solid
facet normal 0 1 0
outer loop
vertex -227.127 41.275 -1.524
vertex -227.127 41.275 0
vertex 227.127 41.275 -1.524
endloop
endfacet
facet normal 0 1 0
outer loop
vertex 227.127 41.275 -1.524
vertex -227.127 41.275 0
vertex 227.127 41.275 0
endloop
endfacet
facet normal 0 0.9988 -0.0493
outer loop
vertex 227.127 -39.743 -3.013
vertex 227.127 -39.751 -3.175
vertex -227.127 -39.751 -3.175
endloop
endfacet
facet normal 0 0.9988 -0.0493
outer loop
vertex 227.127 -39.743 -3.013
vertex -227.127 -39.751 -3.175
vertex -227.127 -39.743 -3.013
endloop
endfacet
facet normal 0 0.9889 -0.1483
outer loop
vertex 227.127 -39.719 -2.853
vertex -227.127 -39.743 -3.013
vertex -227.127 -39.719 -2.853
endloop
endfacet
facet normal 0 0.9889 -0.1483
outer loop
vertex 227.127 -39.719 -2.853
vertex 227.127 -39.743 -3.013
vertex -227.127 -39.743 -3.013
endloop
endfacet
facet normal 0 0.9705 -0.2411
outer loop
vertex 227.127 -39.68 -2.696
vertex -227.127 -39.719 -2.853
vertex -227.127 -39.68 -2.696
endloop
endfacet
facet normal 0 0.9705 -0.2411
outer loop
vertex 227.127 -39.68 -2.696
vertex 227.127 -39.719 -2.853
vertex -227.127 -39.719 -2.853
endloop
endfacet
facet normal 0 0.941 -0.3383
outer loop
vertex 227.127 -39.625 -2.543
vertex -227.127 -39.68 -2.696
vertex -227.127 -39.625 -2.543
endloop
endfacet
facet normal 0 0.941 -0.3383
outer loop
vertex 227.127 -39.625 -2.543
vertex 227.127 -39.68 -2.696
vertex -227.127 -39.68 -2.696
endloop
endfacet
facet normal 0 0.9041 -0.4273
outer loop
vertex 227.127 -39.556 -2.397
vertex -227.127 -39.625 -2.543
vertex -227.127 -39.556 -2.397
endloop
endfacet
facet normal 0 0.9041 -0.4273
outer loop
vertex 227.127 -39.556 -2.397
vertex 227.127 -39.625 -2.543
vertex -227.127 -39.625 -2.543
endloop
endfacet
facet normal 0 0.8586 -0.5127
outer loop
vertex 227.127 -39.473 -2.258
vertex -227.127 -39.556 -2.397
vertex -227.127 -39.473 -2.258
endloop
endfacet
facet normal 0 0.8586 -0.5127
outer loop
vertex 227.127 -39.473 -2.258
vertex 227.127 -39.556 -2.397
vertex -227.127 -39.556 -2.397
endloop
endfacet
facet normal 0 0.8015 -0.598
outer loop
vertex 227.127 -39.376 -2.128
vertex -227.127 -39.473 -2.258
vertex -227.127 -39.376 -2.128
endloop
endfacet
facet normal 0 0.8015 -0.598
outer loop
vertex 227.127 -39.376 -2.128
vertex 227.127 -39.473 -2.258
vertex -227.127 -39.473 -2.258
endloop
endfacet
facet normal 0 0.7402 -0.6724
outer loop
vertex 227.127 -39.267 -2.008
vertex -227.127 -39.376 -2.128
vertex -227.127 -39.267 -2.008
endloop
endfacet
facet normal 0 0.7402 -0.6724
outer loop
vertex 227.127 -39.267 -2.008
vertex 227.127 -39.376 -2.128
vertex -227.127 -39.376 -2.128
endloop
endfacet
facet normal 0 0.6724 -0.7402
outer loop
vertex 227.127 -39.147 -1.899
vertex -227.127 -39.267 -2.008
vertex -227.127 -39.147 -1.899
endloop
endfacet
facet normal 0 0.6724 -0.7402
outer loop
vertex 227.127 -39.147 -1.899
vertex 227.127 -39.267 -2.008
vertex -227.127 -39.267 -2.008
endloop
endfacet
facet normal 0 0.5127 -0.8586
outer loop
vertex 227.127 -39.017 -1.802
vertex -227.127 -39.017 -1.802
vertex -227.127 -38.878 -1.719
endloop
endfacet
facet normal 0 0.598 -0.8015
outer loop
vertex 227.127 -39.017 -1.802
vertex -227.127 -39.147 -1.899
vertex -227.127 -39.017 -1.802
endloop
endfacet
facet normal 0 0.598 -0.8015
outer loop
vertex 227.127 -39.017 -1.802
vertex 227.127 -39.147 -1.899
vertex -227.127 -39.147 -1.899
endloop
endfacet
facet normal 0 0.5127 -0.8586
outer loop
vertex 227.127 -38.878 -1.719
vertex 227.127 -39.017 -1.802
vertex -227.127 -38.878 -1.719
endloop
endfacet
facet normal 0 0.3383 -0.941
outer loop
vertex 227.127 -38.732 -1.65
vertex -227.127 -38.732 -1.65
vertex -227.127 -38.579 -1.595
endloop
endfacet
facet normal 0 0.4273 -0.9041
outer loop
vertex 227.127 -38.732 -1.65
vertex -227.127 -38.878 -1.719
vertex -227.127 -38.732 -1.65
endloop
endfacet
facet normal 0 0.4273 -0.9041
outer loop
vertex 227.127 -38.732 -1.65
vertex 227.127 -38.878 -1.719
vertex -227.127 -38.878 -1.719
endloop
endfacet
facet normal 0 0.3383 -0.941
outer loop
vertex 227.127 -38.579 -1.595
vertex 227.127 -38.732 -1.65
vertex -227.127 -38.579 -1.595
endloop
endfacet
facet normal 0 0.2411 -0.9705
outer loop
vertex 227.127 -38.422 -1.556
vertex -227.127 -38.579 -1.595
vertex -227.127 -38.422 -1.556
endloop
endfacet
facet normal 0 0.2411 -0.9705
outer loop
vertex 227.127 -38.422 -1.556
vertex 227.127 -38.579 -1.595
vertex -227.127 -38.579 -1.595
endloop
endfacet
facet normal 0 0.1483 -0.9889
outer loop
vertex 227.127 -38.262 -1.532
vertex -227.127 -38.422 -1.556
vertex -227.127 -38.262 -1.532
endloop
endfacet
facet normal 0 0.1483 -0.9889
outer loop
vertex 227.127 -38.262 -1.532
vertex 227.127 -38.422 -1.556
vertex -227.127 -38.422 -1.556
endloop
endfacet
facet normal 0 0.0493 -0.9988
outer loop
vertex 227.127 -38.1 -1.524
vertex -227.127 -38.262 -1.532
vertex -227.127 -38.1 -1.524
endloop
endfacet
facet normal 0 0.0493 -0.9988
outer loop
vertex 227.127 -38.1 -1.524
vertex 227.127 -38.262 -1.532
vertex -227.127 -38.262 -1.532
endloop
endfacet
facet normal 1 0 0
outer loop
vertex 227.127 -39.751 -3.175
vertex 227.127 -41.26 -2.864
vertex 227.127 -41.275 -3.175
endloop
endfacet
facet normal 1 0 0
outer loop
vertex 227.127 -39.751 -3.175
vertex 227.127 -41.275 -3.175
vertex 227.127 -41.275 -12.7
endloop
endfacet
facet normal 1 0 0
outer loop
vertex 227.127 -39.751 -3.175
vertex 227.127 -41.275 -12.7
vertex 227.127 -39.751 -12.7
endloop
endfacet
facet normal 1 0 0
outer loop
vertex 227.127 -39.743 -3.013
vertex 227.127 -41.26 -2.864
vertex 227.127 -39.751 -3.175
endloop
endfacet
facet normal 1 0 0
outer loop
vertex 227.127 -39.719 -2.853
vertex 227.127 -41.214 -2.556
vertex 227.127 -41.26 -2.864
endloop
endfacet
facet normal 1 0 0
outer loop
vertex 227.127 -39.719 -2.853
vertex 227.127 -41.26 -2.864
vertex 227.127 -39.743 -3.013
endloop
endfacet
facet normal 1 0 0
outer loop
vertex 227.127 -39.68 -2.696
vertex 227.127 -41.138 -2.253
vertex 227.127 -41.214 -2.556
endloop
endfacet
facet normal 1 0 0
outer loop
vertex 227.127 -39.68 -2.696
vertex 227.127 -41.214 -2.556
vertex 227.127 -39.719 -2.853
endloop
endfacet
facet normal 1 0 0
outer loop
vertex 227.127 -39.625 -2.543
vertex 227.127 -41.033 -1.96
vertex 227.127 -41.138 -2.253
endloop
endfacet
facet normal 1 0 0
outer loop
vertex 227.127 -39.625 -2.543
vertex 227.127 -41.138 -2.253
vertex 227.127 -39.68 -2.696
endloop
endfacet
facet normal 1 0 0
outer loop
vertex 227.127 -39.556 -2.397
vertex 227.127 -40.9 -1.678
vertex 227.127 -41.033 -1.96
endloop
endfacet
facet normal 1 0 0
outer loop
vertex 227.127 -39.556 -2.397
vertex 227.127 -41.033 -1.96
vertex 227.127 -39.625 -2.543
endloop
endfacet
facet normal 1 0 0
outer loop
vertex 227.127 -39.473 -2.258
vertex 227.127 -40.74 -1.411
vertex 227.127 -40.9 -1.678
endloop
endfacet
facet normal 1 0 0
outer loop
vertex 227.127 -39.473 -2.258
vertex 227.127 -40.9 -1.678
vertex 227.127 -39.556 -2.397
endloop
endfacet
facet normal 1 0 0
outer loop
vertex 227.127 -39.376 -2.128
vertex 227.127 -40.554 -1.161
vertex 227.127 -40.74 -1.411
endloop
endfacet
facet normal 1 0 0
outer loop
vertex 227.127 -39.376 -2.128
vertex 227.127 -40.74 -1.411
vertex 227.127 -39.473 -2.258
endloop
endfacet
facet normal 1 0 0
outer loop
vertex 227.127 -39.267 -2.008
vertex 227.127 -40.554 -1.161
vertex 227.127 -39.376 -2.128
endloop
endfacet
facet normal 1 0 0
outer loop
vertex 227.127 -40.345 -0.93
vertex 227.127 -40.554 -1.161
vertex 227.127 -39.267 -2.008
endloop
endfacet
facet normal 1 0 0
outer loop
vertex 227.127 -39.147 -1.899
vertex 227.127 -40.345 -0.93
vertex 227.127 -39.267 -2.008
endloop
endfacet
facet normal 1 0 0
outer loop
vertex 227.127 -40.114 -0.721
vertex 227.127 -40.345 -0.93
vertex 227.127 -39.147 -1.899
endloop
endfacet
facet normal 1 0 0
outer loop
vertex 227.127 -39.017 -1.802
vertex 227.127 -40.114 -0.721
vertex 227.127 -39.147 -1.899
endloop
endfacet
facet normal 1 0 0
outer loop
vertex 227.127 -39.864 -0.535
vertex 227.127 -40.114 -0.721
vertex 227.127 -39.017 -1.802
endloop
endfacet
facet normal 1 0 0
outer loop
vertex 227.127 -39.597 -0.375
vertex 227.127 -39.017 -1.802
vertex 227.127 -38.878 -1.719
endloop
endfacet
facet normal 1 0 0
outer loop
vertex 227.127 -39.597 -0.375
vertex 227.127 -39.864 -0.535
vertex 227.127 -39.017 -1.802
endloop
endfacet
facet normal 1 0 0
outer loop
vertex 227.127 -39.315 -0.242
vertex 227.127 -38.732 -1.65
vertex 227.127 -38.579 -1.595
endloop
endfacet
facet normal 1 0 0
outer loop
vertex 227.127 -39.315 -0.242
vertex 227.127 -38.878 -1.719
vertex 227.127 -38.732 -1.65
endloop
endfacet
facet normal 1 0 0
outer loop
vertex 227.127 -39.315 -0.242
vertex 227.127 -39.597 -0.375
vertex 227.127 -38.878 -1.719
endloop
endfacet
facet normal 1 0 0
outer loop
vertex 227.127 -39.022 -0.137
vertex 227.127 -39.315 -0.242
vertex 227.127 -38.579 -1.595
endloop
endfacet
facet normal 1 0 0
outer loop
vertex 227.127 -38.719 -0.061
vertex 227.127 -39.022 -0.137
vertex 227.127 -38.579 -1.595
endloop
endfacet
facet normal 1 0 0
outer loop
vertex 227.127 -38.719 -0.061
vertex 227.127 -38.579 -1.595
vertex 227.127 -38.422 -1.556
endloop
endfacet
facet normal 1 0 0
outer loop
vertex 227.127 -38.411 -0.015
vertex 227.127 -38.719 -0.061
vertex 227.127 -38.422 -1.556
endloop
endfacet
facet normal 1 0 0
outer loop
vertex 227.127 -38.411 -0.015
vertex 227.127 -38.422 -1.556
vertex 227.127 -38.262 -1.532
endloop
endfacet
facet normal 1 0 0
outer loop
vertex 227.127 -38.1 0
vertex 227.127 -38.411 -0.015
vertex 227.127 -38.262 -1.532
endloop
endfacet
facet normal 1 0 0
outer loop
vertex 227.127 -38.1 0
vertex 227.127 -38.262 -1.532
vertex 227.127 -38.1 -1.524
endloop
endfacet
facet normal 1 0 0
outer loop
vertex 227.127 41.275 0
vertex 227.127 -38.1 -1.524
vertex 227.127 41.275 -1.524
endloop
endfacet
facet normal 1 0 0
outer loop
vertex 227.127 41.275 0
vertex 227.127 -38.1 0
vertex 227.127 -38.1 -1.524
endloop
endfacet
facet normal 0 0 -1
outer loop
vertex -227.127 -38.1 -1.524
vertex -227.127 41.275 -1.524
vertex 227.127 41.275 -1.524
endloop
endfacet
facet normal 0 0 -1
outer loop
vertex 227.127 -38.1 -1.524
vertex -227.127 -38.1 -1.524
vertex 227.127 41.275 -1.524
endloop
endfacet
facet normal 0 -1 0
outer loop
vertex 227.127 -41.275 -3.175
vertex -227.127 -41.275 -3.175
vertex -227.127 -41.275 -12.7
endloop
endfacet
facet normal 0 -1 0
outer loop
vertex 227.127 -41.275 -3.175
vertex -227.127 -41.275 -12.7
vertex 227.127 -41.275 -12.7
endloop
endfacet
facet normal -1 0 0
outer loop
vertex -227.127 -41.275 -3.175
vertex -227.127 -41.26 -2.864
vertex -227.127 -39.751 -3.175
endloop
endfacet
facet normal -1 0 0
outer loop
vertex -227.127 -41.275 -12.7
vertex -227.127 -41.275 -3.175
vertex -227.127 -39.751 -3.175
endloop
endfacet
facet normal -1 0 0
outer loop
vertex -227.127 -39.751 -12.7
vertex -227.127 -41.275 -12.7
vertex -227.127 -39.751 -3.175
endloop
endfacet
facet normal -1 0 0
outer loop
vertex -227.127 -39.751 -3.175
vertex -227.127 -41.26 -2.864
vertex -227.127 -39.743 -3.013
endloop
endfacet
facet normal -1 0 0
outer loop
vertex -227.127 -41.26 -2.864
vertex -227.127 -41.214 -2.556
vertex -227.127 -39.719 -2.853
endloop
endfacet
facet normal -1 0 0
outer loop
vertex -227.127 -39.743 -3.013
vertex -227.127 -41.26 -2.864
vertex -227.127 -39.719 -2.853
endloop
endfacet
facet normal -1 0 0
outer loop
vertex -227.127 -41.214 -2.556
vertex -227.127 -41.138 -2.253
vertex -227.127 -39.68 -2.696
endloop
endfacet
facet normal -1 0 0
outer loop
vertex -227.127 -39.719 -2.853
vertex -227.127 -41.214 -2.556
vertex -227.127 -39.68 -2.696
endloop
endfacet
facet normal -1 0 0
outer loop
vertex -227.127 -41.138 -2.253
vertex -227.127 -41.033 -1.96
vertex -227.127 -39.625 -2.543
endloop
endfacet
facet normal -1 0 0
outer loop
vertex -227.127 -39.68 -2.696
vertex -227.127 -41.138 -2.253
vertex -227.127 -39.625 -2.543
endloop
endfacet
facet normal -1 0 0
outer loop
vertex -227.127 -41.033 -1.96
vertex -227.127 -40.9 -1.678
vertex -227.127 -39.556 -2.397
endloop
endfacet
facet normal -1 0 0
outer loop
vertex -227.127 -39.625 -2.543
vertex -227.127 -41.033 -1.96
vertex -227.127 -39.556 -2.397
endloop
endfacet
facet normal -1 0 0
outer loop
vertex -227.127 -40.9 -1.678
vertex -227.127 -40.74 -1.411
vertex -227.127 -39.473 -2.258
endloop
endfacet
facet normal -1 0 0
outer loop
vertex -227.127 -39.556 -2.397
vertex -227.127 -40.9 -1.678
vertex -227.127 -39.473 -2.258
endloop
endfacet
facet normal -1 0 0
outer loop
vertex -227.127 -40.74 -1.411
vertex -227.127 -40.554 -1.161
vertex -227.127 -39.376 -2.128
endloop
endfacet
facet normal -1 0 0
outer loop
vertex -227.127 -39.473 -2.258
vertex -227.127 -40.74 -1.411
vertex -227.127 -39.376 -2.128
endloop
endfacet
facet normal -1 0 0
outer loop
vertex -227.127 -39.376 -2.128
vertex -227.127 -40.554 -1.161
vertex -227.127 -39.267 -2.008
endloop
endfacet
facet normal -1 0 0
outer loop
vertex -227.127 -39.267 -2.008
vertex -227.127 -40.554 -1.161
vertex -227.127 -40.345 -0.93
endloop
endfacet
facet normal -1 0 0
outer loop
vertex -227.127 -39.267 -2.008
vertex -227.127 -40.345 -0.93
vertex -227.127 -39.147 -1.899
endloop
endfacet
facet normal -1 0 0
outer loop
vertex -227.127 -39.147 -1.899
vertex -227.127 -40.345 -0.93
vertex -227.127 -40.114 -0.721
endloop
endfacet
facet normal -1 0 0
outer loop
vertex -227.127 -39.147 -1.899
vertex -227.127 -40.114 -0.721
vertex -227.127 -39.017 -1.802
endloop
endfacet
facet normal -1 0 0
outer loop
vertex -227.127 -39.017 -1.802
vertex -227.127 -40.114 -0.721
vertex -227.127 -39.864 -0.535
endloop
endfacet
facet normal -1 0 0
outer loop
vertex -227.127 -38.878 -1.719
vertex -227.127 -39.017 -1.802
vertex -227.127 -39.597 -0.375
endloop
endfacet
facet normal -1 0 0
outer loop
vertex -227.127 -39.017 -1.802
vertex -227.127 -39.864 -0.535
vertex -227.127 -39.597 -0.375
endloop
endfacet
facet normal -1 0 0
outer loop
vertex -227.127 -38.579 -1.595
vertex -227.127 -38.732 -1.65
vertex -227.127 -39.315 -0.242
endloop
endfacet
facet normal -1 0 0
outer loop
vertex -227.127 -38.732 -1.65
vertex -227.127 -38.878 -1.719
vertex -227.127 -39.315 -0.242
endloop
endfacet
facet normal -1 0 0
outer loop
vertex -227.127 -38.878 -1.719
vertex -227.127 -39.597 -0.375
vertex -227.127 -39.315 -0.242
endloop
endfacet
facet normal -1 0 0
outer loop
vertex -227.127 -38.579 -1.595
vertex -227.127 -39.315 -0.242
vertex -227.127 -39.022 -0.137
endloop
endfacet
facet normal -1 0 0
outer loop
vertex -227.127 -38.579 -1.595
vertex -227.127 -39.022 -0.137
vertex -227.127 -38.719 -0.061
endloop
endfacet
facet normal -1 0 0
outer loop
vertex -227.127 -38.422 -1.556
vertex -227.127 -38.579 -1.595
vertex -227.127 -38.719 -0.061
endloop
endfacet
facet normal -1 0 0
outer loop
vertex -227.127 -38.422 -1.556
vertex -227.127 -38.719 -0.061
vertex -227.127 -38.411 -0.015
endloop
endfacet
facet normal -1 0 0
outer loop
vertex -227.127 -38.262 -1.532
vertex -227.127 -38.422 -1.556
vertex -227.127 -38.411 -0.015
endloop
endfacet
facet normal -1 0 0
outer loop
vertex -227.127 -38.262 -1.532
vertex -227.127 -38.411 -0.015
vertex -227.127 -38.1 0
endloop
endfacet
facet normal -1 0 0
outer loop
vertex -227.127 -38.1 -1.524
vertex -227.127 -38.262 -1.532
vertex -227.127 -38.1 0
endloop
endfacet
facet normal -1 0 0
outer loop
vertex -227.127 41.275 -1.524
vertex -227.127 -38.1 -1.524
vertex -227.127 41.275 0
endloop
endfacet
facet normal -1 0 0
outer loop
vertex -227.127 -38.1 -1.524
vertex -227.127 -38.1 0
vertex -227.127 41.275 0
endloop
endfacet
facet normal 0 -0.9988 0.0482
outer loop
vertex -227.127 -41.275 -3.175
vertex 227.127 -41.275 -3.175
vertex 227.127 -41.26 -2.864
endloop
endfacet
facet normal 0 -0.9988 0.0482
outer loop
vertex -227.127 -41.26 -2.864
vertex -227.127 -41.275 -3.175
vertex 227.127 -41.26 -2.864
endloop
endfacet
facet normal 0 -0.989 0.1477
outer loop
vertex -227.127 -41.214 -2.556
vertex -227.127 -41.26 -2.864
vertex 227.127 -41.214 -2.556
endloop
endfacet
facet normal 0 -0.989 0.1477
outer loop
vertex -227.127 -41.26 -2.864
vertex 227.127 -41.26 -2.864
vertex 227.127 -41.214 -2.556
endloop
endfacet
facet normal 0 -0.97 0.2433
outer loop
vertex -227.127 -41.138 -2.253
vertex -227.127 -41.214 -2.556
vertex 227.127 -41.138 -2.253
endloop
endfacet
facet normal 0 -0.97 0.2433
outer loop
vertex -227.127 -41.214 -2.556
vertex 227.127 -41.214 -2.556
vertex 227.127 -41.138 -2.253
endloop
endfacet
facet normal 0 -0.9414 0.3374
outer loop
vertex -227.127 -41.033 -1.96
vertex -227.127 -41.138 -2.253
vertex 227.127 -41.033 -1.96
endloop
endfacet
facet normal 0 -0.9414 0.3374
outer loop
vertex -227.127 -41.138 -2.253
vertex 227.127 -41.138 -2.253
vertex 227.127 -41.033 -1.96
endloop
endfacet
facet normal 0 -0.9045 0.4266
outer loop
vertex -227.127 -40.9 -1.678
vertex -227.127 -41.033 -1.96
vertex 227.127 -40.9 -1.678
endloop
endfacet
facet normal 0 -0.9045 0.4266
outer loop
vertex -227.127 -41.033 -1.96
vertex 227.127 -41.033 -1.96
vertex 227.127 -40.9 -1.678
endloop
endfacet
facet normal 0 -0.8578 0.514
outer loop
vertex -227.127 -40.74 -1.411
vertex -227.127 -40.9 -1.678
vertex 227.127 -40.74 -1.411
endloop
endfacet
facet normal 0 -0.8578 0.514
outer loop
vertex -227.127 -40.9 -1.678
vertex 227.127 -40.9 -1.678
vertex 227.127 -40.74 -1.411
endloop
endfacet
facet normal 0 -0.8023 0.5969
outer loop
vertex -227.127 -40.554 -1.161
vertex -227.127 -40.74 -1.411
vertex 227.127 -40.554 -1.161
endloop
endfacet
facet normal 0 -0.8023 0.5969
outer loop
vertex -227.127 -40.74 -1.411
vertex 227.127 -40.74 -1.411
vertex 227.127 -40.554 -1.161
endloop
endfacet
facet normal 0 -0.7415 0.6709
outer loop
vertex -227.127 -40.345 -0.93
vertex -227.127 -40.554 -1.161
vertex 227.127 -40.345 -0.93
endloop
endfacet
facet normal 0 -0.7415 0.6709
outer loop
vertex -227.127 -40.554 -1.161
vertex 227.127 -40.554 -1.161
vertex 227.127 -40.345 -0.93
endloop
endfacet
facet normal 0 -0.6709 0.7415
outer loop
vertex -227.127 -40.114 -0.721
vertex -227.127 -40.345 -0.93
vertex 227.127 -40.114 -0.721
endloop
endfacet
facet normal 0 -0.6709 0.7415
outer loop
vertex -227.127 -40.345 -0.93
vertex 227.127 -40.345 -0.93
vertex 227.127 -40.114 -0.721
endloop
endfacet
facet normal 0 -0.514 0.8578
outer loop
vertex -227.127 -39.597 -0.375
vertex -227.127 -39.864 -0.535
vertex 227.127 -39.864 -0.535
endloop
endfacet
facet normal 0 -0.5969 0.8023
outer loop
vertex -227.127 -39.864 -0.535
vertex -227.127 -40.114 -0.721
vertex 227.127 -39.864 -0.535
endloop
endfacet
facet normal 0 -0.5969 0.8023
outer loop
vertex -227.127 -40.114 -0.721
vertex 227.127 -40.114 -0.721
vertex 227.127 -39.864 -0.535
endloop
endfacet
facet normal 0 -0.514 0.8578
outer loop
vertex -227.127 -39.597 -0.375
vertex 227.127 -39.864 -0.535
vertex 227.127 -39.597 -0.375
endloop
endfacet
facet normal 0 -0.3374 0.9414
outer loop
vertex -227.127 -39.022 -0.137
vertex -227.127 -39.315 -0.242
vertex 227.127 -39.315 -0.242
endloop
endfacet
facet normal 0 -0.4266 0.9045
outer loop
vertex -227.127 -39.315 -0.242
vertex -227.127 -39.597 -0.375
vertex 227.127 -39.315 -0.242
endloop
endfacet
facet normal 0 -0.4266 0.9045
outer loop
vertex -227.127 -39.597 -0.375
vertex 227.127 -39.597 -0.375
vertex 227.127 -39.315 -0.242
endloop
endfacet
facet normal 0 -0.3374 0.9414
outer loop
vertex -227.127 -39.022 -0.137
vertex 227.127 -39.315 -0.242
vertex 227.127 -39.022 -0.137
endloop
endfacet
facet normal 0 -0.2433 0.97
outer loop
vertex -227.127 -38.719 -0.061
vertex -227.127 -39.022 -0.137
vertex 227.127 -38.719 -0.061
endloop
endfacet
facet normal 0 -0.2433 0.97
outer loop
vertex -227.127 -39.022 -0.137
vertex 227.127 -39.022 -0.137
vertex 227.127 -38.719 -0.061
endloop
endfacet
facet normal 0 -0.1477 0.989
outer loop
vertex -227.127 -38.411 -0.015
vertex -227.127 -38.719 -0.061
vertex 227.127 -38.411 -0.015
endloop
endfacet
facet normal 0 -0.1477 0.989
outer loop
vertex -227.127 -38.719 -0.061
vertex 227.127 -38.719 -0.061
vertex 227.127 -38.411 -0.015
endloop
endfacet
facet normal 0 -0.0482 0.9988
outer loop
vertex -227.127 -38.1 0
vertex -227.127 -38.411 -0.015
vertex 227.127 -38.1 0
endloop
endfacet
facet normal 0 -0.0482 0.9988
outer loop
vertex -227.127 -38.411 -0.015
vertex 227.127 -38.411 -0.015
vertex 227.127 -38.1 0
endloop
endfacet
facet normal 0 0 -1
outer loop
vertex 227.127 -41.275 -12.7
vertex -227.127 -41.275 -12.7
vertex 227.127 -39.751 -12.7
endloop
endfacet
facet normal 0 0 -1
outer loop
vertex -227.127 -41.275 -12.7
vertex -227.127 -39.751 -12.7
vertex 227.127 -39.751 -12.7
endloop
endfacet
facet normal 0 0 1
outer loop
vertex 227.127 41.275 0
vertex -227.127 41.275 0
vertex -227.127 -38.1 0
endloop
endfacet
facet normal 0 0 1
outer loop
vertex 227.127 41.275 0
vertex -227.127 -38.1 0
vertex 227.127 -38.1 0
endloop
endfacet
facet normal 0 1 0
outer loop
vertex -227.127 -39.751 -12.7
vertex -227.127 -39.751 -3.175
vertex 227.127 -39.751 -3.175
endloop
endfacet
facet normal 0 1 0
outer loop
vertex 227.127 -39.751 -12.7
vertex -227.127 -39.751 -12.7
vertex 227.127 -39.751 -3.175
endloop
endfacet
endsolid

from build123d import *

# Parameters (mm, degrees)
F0_W     = 482.6
F0_H     = 82.55
F1_DEPTH = 12.7
F2_R     = 3.175
F3_T     = -1.524
F4_W     = 14.1732
F4_H     = 82.55
F5_DEPTH = 25.4


with BuildPart() as f1:
    # F0 (on Top) → F1 (new body)
    with BuildSketch(Plane.XY):
        Rectangle(F0_W, F0_H)
    extrude(amount=-F1_DEPTH)

    # F2
    f2_edges = [f1.edges().sort_by_distance(p)[0] for p in [
        (0, -41.275, 0),
    ]]
    fillet(f2_edges, radius=F2_R)

    # F3
    f3_openings = [f1.faces().sort_by_distance(p)[0] for p in [
        (0, 0, -12.7),
        (241.3, 0.08388, -6.361664),
        (0, 41.275, -6.35),
        (-241.3, 0.08388, -6.361664),
    ]]
    offset(amount=F3_T, openings=f3_openings)

    # F4 (on face) → F5 (cut)
    with BuildSketch(Plane.XY):
        with Locations((-234.2134, 0)):
            Rectangle(F4_W, F4_H)
        with Locations((234.2134, 0)):
            Rectangle(F4_W, F4_H)
    extrude(amount=-F5_DEPTH, mode=Mode.SUBTRACT)


solid = f1.part
